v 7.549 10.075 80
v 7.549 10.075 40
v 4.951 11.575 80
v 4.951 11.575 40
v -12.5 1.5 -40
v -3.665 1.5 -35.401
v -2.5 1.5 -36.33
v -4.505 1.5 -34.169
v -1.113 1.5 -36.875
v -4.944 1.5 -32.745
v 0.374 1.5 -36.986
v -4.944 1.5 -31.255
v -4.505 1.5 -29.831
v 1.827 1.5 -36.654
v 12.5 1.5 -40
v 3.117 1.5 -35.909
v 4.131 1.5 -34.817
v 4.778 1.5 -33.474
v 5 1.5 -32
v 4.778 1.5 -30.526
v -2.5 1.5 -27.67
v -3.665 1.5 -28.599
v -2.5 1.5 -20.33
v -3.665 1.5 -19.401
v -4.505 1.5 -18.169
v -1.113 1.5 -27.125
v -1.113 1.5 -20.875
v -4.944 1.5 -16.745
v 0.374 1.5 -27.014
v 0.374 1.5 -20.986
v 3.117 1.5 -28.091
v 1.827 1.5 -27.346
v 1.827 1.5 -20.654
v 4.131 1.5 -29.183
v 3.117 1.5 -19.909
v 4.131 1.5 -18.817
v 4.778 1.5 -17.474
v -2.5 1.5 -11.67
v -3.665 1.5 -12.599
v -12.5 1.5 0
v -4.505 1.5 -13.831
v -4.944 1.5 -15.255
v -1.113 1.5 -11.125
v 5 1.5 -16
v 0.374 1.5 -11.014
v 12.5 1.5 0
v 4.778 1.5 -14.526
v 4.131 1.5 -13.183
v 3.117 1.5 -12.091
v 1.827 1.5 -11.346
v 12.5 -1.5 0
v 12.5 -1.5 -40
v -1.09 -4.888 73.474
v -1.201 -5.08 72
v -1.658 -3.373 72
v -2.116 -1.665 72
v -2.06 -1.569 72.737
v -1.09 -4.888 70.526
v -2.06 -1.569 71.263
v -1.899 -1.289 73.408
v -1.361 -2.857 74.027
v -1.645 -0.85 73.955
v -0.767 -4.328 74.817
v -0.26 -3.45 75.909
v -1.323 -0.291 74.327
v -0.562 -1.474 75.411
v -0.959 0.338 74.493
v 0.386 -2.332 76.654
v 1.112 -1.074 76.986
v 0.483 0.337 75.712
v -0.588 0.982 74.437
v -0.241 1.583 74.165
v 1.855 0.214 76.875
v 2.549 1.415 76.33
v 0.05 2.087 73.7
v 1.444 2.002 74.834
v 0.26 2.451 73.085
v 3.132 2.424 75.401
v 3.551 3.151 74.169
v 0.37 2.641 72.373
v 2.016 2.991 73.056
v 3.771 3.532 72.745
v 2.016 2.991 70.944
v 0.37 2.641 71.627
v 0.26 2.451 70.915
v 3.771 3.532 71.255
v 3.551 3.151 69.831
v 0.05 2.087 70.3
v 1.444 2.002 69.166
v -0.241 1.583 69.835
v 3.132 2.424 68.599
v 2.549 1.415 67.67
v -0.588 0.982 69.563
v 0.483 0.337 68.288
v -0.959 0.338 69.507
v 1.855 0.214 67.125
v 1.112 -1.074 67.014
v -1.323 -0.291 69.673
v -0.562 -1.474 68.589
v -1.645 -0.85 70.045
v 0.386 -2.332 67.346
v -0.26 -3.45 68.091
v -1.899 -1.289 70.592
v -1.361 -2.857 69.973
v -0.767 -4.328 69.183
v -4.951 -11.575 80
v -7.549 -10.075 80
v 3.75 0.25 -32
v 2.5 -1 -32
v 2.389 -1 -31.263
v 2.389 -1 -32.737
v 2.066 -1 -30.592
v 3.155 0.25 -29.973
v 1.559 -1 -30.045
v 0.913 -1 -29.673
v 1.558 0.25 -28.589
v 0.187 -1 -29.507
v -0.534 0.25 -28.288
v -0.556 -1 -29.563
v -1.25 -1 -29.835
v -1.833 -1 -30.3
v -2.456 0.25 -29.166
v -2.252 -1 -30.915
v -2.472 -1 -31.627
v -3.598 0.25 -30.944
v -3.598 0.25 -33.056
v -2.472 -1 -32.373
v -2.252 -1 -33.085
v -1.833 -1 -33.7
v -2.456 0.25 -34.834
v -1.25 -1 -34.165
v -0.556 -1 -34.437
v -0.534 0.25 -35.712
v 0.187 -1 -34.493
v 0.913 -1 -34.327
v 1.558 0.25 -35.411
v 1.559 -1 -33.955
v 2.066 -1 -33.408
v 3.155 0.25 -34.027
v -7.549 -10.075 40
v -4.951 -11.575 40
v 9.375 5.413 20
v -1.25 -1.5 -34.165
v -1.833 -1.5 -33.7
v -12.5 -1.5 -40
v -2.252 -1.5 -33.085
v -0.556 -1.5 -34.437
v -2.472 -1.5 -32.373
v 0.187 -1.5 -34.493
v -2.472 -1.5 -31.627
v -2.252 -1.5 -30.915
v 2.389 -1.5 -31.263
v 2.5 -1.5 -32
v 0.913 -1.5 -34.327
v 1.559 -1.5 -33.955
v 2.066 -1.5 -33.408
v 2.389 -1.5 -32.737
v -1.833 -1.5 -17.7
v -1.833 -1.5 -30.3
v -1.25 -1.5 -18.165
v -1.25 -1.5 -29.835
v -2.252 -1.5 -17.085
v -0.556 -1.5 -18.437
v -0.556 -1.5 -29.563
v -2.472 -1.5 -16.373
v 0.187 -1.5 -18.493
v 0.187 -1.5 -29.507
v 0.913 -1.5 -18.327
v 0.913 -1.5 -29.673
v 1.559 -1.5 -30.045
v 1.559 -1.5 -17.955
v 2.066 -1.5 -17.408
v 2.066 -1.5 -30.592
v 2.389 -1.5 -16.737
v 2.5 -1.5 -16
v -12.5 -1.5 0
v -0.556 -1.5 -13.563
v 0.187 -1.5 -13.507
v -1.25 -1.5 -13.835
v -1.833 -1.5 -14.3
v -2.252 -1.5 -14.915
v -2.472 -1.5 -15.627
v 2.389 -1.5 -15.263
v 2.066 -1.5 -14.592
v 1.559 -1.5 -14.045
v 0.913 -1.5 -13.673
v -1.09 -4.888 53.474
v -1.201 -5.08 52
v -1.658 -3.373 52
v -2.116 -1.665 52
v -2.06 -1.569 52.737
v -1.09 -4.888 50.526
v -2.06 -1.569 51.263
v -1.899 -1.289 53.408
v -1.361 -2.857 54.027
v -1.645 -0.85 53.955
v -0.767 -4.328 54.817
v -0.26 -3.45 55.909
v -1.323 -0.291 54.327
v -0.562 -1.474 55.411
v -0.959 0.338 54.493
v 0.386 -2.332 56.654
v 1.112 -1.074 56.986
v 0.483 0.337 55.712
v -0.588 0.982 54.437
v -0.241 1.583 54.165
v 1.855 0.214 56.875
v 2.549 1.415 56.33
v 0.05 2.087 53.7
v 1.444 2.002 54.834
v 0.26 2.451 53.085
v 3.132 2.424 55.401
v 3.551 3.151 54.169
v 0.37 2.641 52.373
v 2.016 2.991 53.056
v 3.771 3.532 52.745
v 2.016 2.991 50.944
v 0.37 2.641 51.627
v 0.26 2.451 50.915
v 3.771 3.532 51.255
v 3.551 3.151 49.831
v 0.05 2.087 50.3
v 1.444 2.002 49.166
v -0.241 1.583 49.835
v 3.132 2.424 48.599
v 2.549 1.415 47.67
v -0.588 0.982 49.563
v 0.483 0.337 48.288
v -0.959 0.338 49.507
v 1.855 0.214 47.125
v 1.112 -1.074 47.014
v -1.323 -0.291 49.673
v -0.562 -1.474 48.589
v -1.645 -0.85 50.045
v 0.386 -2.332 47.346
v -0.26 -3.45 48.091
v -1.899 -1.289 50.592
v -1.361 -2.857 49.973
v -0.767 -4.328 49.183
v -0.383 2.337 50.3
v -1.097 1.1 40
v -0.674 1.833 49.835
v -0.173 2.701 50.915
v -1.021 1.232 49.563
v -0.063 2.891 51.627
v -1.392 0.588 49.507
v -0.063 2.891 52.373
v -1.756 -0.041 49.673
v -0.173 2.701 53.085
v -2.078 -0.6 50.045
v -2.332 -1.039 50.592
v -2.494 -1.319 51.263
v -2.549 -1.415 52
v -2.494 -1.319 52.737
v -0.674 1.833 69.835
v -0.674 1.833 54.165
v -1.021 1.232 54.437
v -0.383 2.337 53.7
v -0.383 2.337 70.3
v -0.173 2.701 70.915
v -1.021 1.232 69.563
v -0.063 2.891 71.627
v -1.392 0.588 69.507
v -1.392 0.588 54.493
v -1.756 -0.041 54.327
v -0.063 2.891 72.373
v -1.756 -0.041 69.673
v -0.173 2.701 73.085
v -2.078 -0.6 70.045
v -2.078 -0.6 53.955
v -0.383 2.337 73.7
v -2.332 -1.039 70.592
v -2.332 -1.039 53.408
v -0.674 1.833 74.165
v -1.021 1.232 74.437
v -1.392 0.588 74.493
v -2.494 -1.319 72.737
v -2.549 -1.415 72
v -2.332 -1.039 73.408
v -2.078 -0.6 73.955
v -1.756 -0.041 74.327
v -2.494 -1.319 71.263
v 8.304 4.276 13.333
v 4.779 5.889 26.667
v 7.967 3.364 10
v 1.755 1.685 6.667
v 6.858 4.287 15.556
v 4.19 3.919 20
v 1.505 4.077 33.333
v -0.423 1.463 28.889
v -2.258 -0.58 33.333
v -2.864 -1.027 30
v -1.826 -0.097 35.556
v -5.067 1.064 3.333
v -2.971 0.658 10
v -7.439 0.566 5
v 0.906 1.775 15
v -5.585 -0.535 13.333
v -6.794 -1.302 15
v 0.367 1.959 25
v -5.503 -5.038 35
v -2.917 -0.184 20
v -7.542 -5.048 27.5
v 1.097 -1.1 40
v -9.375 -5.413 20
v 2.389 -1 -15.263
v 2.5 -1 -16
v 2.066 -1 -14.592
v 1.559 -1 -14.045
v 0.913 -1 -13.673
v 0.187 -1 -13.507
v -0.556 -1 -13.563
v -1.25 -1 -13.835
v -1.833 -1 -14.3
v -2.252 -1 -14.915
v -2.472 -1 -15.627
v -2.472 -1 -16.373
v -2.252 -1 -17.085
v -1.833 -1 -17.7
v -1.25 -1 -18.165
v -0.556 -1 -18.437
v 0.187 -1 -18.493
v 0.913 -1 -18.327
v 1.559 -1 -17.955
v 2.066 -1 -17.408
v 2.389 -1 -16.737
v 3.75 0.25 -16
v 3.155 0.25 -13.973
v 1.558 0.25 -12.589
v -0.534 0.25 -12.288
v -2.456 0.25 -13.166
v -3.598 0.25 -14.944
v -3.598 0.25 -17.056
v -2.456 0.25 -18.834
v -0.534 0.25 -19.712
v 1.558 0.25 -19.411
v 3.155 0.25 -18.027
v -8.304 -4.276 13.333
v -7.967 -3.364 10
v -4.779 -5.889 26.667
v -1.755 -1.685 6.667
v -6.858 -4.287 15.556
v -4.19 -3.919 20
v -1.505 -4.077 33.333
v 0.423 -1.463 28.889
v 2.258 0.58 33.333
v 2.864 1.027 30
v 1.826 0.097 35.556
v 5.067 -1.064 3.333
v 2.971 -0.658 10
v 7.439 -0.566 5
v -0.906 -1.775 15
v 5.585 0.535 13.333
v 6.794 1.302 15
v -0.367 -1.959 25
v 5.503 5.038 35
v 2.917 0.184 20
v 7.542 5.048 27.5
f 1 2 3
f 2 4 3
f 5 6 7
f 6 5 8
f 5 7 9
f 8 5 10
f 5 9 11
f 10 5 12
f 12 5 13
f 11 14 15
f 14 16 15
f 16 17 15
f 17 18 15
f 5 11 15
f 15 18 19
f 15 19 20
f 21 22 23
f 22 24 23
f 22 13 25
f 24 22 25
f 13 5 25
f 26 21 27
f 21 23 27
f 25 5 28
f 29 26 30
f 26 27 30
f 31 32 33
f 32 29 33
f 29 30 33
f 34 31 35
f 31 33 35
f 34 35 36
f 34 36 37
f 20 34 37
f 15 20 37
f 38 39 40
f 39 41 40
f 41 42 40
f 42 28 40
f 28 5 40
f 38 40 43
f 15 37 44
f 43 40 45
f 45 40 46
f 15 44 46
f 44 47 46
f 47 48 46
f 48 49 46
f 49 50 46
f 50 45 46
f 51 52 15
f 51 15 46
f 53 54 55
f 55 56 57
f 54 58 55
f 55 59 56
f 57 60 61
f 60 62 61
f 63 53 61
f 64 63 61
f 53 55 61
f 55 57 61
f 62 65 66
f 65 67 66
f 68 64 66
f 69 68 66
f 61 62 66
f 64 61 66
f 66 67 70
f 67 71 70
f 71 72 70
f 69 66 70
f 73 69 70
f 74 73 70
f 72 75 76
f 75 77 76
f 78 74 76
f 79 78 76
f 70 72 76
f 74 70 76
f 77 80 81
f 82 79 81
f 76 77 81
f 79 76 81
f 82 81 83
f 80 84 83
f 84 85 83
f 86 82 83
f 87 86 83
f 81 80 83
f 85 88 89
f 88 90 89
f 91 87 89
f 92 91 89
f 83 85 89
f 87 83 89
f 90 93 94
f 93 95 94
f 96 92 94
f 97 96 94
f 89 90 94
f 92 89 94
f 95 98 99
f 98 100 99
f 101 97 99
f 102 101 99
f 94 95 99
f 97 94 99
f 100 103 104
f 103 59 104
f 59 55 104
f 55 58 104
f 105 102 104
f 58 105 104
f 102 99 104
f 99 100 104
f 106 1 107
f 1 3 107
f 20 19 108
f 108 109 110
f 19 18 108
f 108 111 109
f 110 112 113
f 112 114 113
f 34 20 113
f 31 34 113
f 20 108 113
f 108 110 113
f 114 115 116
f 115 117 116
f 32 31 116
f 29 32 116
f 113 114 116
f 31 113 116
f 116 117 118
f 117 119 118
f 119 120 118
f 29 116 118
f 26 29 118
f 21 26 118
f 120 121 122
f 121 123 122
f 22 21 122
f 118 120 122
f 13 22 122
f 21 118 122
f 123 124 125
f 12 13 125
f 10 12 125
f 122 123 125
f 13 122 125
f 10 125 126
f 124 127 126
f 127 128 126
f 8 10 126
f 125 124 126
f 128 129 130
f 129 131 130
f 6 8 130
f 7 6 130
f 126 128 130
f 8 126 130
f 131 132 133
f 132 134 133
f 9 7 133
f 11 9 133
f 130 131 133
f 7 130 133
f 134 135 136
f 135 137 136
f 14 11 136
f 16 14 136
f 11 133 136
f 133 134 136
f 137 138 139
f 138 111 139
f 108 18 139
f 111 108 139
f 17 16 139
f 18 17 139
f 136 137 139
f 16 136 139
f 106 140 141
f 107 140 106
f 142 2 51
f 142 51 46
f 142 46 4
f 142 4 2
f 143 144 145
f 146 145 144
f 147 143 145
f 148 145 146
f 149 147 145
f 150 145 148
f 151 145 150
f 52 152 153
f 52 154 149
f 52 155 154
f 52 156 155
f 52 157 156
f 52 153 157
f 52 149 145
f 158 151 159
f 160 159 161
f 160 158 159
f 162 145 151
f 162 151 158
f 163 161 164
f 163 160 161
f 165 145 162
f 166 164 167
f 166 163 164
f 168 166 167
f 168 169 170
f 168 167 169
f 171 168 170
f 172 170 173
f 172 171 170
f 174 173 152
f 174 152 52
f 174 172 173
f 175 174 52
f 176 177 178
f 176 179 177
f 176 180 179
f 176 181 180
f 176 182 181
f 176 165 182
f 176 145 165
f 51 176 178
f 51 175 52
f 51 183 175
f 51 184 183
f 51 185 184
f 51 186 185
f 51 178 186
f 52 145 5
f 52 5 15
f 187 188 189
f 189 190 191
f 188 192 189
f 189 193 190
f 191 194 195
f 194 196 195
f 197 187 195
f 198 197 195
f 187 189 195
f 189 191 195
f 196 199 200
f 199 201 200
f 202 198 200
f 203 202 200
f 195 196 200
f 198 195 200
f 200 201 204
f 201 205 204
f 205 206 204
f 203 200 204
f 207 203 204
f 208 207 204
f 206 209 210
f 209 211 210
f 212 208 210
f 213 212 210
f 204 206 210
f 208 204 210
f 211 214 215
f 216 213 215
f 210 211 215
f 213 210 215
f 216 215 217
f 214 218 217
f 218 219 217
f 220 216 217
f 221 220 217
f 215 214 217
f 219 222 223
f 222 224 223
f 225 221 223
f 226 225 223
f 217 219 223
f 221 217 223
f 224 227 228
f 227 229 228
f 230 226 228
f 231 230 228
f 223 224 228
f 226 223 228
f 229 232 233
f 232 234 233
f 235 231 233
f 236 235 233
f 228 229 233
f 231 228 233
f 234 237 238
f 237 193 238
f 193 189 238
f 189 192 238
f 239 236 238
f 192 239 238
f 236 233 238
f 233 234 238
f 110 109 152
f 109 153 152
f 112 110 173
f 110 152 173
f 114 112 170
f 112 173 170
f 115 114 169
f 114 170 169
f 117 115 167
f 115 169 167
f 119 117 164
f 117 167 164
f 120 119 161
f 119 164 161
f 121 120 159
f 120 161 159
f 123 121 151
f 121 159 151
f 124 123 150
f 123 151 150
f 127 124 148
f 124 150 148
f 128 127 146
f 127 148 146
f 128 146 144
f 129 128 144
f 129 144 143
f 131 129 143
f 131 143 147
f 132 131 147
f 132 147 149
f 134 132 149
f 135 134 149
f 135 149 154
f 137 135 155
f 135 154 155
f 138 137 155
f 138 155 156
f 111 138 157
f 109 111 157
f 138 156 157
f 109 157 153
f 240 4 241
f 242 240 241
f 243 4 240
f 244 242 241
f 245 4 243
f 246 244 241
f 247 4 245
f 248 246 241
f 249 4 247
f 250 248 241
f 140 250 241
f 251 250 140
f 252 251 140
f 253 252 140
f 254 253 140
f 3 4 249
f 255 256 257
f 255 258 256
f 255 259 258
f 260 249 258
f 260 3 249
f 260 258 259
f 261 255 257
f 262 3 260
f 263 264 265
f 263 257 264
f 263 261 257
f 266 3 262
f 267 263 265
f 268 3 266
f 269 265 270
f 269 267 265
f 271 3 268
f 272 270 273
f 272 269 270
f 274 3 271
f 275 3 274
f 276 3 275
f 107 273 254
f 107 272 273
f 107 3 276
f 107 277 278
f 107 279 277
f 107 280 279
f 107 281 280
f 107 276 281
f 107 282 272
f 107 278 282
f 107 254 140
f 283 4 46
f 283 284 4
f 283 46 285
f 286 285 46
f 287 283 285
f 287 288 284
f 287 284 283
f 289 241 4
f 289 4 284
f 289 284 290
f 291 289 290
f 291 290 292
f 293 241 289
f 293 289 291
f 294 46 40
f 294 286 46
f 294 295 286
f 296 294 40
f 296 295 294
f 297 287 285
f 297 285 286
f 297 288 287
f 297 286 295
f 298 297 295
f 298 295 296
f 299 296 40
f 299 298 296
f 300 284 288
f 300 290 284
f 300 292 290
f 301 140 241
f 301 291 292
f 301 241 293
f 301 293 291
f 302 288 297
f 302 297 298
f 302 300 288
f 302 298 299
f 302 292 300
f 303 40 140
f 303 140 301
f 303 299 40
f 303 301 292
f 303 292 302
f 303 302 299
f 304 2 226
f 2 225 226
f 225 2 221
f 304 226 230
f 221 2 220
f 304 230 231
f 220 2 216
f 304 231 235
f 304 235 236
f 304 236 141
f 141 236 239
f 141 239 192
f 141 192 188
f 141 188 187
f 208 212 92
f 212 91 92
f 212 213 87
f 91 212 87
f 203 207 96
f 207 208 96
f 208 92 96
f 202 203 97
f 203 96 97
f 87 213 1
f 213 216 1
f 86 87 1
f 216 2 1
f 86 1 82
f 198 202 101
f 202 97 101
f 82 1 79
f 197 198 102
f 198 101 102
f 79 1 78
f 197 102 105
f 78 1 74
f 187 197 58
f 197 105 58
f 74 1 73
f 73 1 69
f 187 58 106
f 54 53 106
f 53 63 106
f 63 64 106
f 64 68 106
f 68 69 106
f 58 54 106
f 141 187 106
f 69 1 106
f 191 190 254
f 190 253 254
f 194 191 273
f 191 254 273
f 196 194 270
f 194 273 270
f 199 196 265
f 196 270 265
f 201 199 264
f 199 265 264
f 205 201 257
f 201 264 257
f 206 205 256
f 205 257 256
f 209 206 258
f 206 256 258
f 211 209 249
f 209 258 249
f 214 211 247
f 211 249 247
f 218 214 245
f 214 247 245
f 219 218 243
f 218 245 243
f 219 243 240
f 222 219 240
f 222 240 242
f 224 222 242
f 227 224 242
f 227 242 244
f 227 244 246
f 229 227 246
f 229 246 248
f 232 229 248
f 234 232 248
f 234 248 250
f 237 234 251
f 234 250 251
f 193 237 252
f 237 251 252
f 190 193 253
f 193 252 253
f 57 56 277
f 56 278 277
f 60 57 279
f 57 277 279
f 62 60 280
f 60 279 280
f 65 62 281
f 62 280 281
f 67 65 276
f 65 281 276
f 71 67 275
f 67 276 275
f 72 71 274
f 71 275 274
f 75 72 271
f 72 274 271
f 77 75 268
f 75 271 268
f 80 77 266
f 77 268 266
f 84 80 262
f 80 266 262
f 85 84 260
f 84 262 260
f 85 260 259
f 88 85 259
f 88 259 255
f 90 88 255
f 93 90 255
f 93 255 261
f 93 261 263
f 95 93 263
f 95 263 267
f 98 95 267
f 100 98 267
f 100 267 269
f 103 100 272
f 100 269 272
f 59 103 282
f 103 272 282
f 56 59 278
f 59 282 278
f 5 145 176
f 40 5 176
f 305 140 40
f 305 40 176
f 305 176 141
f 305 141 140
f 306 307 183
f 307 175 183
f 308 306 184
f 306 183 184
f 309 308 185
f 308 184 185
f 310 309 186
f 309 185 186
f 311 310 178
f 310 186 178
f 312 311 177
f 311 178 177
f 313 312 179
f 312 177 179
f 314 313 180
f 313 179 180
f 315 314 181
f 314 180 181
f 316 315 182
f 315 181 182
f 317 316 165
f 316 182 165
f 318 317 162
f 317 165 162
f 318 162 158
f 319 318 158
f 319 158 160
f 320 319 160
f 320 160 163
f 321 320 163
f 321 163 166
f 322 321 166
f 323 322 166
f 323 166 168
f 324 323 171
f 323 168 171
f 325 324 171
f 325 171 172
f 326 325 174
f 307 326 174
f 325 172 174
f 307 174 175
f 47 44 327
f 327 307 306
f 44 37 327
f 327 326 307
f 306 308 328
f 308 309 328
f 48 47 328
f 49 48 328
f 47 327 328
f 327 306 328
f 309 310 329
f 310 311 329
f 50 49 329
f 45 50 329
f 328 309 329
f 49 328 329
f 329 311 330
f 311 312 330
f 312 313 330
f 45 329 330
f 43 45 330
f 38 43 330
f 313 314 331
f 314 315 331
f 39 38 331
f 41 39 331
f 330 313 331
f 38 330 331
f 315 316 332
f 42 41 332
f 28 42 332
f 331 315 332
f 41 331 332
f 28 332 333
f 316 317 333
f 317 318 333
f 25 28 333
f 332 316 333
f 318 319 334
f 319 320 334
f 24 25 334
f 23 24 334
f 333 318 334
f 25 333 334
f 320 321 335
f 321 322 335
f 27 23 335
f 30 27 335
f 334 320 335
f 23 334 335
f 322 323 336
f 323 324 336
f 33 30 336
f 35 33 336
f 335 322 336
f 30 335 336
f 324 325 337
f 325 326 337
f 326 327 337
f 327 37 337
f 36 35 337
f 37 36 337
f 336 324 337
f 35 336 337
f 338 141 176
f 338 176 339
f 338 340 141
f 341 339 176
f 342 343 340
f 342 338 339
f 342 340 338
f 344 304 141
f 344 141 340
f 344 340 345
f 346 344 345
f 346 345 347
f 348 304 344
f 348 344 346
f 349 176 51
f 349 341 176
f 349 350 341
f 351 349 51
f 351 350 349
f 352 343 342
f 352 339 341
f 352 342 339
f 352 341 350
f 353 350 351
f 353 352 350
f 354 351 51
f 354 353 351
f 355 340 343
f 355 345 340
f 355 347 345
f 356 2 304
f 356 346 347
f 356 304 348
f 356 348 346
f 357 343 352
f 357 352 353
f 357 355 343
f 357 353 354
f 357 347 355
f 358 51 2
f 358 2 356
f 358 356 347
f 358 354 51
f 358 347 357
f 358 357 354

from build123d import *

# Parameters (mm, degrees)
F0_W            = 25
F0_H            = 40
F1_DEPTH        = 1.5
F4_W            = 25
F4_H            = 40
F5_DEPTH        = 1.5
F1_FACE_W       = 25
F1_FACE_H       = 3
F8_D            = 5
F8_CSINK_D      = 10
F8_CSINK_ANGLE  = 90
F10_D           = 5
F10_CSINK_D     = 10
F10_CSINK_ANGLE = 90


with BuildPart() as f1:
    # F0 (on Front) → F1 (new body, symmetric)
    with BuildSketch(Plane.XZ):
        with Locations((0, -20)):
            Rectangle(F0_W, F0_H)
    extrude(amount=F1_DEPTH, both=True)



with BuildPart() as f5:
    # F4 (on face) → F5 (new body, symmetric)
    with BuildSketch(Plane(origin=(0, 0, 0), x_dir=(-0.5, -0.866025, 0), z_dir=(-0.866025, 0.5, 0))):
        with Locations((0, 60)):
            Rectangle(F4_W, F4_H)
    extrude(amount=F5_DEPTH, both=True)


with BuildPart() as f1_1:
    add(f1.part)

    add(f5.part)  # F6 merges F5
    # F1_face (on face) → F6 section 0
    with BuildSketch(Plane.XY):
        Rectangle(F1_FACE_W, F1_FACE_H)
    # F5_face (on face) → F6 section 1
    with BuildSketch(Plane(origin=(0, 0, 40), x_dir=(1, 0, 0), z_dir=(0, 0, -1))):
        Polygon((7.549038, -10.075318), (-4.950962, 11.575318), (-7.549038, 10.075318), (4.950962, -11.575318), align=None)
    loft()

    # F8 (through all)
    with Locations(Plane(origin=(0, 1.5, 0), x_dir=(-1, 0, 0), z_dir=(0, 1, 0))):
        with Locations((0, -32), (0, -16)):
            CounterSinkHole(F8_D / 2, F8_CSINK_D / 2, counter_sink_angle=F8_CSINK_ANGLE)

    # F10 (through all)
    with Locations(Plane(origin=(1.299038, -0.75, 0), x_dir=(0.5, 0.866025, 0), z_dir=(0.866025, -0.5, 0))):
        with Locations((0, 72), (0, 52)):
            CounterSinkHole(F10_D / 2, F10_CSINK_D / 2, counter_sink_angle=F10_CSINK_ANGLE)


solid = f1_1.part
